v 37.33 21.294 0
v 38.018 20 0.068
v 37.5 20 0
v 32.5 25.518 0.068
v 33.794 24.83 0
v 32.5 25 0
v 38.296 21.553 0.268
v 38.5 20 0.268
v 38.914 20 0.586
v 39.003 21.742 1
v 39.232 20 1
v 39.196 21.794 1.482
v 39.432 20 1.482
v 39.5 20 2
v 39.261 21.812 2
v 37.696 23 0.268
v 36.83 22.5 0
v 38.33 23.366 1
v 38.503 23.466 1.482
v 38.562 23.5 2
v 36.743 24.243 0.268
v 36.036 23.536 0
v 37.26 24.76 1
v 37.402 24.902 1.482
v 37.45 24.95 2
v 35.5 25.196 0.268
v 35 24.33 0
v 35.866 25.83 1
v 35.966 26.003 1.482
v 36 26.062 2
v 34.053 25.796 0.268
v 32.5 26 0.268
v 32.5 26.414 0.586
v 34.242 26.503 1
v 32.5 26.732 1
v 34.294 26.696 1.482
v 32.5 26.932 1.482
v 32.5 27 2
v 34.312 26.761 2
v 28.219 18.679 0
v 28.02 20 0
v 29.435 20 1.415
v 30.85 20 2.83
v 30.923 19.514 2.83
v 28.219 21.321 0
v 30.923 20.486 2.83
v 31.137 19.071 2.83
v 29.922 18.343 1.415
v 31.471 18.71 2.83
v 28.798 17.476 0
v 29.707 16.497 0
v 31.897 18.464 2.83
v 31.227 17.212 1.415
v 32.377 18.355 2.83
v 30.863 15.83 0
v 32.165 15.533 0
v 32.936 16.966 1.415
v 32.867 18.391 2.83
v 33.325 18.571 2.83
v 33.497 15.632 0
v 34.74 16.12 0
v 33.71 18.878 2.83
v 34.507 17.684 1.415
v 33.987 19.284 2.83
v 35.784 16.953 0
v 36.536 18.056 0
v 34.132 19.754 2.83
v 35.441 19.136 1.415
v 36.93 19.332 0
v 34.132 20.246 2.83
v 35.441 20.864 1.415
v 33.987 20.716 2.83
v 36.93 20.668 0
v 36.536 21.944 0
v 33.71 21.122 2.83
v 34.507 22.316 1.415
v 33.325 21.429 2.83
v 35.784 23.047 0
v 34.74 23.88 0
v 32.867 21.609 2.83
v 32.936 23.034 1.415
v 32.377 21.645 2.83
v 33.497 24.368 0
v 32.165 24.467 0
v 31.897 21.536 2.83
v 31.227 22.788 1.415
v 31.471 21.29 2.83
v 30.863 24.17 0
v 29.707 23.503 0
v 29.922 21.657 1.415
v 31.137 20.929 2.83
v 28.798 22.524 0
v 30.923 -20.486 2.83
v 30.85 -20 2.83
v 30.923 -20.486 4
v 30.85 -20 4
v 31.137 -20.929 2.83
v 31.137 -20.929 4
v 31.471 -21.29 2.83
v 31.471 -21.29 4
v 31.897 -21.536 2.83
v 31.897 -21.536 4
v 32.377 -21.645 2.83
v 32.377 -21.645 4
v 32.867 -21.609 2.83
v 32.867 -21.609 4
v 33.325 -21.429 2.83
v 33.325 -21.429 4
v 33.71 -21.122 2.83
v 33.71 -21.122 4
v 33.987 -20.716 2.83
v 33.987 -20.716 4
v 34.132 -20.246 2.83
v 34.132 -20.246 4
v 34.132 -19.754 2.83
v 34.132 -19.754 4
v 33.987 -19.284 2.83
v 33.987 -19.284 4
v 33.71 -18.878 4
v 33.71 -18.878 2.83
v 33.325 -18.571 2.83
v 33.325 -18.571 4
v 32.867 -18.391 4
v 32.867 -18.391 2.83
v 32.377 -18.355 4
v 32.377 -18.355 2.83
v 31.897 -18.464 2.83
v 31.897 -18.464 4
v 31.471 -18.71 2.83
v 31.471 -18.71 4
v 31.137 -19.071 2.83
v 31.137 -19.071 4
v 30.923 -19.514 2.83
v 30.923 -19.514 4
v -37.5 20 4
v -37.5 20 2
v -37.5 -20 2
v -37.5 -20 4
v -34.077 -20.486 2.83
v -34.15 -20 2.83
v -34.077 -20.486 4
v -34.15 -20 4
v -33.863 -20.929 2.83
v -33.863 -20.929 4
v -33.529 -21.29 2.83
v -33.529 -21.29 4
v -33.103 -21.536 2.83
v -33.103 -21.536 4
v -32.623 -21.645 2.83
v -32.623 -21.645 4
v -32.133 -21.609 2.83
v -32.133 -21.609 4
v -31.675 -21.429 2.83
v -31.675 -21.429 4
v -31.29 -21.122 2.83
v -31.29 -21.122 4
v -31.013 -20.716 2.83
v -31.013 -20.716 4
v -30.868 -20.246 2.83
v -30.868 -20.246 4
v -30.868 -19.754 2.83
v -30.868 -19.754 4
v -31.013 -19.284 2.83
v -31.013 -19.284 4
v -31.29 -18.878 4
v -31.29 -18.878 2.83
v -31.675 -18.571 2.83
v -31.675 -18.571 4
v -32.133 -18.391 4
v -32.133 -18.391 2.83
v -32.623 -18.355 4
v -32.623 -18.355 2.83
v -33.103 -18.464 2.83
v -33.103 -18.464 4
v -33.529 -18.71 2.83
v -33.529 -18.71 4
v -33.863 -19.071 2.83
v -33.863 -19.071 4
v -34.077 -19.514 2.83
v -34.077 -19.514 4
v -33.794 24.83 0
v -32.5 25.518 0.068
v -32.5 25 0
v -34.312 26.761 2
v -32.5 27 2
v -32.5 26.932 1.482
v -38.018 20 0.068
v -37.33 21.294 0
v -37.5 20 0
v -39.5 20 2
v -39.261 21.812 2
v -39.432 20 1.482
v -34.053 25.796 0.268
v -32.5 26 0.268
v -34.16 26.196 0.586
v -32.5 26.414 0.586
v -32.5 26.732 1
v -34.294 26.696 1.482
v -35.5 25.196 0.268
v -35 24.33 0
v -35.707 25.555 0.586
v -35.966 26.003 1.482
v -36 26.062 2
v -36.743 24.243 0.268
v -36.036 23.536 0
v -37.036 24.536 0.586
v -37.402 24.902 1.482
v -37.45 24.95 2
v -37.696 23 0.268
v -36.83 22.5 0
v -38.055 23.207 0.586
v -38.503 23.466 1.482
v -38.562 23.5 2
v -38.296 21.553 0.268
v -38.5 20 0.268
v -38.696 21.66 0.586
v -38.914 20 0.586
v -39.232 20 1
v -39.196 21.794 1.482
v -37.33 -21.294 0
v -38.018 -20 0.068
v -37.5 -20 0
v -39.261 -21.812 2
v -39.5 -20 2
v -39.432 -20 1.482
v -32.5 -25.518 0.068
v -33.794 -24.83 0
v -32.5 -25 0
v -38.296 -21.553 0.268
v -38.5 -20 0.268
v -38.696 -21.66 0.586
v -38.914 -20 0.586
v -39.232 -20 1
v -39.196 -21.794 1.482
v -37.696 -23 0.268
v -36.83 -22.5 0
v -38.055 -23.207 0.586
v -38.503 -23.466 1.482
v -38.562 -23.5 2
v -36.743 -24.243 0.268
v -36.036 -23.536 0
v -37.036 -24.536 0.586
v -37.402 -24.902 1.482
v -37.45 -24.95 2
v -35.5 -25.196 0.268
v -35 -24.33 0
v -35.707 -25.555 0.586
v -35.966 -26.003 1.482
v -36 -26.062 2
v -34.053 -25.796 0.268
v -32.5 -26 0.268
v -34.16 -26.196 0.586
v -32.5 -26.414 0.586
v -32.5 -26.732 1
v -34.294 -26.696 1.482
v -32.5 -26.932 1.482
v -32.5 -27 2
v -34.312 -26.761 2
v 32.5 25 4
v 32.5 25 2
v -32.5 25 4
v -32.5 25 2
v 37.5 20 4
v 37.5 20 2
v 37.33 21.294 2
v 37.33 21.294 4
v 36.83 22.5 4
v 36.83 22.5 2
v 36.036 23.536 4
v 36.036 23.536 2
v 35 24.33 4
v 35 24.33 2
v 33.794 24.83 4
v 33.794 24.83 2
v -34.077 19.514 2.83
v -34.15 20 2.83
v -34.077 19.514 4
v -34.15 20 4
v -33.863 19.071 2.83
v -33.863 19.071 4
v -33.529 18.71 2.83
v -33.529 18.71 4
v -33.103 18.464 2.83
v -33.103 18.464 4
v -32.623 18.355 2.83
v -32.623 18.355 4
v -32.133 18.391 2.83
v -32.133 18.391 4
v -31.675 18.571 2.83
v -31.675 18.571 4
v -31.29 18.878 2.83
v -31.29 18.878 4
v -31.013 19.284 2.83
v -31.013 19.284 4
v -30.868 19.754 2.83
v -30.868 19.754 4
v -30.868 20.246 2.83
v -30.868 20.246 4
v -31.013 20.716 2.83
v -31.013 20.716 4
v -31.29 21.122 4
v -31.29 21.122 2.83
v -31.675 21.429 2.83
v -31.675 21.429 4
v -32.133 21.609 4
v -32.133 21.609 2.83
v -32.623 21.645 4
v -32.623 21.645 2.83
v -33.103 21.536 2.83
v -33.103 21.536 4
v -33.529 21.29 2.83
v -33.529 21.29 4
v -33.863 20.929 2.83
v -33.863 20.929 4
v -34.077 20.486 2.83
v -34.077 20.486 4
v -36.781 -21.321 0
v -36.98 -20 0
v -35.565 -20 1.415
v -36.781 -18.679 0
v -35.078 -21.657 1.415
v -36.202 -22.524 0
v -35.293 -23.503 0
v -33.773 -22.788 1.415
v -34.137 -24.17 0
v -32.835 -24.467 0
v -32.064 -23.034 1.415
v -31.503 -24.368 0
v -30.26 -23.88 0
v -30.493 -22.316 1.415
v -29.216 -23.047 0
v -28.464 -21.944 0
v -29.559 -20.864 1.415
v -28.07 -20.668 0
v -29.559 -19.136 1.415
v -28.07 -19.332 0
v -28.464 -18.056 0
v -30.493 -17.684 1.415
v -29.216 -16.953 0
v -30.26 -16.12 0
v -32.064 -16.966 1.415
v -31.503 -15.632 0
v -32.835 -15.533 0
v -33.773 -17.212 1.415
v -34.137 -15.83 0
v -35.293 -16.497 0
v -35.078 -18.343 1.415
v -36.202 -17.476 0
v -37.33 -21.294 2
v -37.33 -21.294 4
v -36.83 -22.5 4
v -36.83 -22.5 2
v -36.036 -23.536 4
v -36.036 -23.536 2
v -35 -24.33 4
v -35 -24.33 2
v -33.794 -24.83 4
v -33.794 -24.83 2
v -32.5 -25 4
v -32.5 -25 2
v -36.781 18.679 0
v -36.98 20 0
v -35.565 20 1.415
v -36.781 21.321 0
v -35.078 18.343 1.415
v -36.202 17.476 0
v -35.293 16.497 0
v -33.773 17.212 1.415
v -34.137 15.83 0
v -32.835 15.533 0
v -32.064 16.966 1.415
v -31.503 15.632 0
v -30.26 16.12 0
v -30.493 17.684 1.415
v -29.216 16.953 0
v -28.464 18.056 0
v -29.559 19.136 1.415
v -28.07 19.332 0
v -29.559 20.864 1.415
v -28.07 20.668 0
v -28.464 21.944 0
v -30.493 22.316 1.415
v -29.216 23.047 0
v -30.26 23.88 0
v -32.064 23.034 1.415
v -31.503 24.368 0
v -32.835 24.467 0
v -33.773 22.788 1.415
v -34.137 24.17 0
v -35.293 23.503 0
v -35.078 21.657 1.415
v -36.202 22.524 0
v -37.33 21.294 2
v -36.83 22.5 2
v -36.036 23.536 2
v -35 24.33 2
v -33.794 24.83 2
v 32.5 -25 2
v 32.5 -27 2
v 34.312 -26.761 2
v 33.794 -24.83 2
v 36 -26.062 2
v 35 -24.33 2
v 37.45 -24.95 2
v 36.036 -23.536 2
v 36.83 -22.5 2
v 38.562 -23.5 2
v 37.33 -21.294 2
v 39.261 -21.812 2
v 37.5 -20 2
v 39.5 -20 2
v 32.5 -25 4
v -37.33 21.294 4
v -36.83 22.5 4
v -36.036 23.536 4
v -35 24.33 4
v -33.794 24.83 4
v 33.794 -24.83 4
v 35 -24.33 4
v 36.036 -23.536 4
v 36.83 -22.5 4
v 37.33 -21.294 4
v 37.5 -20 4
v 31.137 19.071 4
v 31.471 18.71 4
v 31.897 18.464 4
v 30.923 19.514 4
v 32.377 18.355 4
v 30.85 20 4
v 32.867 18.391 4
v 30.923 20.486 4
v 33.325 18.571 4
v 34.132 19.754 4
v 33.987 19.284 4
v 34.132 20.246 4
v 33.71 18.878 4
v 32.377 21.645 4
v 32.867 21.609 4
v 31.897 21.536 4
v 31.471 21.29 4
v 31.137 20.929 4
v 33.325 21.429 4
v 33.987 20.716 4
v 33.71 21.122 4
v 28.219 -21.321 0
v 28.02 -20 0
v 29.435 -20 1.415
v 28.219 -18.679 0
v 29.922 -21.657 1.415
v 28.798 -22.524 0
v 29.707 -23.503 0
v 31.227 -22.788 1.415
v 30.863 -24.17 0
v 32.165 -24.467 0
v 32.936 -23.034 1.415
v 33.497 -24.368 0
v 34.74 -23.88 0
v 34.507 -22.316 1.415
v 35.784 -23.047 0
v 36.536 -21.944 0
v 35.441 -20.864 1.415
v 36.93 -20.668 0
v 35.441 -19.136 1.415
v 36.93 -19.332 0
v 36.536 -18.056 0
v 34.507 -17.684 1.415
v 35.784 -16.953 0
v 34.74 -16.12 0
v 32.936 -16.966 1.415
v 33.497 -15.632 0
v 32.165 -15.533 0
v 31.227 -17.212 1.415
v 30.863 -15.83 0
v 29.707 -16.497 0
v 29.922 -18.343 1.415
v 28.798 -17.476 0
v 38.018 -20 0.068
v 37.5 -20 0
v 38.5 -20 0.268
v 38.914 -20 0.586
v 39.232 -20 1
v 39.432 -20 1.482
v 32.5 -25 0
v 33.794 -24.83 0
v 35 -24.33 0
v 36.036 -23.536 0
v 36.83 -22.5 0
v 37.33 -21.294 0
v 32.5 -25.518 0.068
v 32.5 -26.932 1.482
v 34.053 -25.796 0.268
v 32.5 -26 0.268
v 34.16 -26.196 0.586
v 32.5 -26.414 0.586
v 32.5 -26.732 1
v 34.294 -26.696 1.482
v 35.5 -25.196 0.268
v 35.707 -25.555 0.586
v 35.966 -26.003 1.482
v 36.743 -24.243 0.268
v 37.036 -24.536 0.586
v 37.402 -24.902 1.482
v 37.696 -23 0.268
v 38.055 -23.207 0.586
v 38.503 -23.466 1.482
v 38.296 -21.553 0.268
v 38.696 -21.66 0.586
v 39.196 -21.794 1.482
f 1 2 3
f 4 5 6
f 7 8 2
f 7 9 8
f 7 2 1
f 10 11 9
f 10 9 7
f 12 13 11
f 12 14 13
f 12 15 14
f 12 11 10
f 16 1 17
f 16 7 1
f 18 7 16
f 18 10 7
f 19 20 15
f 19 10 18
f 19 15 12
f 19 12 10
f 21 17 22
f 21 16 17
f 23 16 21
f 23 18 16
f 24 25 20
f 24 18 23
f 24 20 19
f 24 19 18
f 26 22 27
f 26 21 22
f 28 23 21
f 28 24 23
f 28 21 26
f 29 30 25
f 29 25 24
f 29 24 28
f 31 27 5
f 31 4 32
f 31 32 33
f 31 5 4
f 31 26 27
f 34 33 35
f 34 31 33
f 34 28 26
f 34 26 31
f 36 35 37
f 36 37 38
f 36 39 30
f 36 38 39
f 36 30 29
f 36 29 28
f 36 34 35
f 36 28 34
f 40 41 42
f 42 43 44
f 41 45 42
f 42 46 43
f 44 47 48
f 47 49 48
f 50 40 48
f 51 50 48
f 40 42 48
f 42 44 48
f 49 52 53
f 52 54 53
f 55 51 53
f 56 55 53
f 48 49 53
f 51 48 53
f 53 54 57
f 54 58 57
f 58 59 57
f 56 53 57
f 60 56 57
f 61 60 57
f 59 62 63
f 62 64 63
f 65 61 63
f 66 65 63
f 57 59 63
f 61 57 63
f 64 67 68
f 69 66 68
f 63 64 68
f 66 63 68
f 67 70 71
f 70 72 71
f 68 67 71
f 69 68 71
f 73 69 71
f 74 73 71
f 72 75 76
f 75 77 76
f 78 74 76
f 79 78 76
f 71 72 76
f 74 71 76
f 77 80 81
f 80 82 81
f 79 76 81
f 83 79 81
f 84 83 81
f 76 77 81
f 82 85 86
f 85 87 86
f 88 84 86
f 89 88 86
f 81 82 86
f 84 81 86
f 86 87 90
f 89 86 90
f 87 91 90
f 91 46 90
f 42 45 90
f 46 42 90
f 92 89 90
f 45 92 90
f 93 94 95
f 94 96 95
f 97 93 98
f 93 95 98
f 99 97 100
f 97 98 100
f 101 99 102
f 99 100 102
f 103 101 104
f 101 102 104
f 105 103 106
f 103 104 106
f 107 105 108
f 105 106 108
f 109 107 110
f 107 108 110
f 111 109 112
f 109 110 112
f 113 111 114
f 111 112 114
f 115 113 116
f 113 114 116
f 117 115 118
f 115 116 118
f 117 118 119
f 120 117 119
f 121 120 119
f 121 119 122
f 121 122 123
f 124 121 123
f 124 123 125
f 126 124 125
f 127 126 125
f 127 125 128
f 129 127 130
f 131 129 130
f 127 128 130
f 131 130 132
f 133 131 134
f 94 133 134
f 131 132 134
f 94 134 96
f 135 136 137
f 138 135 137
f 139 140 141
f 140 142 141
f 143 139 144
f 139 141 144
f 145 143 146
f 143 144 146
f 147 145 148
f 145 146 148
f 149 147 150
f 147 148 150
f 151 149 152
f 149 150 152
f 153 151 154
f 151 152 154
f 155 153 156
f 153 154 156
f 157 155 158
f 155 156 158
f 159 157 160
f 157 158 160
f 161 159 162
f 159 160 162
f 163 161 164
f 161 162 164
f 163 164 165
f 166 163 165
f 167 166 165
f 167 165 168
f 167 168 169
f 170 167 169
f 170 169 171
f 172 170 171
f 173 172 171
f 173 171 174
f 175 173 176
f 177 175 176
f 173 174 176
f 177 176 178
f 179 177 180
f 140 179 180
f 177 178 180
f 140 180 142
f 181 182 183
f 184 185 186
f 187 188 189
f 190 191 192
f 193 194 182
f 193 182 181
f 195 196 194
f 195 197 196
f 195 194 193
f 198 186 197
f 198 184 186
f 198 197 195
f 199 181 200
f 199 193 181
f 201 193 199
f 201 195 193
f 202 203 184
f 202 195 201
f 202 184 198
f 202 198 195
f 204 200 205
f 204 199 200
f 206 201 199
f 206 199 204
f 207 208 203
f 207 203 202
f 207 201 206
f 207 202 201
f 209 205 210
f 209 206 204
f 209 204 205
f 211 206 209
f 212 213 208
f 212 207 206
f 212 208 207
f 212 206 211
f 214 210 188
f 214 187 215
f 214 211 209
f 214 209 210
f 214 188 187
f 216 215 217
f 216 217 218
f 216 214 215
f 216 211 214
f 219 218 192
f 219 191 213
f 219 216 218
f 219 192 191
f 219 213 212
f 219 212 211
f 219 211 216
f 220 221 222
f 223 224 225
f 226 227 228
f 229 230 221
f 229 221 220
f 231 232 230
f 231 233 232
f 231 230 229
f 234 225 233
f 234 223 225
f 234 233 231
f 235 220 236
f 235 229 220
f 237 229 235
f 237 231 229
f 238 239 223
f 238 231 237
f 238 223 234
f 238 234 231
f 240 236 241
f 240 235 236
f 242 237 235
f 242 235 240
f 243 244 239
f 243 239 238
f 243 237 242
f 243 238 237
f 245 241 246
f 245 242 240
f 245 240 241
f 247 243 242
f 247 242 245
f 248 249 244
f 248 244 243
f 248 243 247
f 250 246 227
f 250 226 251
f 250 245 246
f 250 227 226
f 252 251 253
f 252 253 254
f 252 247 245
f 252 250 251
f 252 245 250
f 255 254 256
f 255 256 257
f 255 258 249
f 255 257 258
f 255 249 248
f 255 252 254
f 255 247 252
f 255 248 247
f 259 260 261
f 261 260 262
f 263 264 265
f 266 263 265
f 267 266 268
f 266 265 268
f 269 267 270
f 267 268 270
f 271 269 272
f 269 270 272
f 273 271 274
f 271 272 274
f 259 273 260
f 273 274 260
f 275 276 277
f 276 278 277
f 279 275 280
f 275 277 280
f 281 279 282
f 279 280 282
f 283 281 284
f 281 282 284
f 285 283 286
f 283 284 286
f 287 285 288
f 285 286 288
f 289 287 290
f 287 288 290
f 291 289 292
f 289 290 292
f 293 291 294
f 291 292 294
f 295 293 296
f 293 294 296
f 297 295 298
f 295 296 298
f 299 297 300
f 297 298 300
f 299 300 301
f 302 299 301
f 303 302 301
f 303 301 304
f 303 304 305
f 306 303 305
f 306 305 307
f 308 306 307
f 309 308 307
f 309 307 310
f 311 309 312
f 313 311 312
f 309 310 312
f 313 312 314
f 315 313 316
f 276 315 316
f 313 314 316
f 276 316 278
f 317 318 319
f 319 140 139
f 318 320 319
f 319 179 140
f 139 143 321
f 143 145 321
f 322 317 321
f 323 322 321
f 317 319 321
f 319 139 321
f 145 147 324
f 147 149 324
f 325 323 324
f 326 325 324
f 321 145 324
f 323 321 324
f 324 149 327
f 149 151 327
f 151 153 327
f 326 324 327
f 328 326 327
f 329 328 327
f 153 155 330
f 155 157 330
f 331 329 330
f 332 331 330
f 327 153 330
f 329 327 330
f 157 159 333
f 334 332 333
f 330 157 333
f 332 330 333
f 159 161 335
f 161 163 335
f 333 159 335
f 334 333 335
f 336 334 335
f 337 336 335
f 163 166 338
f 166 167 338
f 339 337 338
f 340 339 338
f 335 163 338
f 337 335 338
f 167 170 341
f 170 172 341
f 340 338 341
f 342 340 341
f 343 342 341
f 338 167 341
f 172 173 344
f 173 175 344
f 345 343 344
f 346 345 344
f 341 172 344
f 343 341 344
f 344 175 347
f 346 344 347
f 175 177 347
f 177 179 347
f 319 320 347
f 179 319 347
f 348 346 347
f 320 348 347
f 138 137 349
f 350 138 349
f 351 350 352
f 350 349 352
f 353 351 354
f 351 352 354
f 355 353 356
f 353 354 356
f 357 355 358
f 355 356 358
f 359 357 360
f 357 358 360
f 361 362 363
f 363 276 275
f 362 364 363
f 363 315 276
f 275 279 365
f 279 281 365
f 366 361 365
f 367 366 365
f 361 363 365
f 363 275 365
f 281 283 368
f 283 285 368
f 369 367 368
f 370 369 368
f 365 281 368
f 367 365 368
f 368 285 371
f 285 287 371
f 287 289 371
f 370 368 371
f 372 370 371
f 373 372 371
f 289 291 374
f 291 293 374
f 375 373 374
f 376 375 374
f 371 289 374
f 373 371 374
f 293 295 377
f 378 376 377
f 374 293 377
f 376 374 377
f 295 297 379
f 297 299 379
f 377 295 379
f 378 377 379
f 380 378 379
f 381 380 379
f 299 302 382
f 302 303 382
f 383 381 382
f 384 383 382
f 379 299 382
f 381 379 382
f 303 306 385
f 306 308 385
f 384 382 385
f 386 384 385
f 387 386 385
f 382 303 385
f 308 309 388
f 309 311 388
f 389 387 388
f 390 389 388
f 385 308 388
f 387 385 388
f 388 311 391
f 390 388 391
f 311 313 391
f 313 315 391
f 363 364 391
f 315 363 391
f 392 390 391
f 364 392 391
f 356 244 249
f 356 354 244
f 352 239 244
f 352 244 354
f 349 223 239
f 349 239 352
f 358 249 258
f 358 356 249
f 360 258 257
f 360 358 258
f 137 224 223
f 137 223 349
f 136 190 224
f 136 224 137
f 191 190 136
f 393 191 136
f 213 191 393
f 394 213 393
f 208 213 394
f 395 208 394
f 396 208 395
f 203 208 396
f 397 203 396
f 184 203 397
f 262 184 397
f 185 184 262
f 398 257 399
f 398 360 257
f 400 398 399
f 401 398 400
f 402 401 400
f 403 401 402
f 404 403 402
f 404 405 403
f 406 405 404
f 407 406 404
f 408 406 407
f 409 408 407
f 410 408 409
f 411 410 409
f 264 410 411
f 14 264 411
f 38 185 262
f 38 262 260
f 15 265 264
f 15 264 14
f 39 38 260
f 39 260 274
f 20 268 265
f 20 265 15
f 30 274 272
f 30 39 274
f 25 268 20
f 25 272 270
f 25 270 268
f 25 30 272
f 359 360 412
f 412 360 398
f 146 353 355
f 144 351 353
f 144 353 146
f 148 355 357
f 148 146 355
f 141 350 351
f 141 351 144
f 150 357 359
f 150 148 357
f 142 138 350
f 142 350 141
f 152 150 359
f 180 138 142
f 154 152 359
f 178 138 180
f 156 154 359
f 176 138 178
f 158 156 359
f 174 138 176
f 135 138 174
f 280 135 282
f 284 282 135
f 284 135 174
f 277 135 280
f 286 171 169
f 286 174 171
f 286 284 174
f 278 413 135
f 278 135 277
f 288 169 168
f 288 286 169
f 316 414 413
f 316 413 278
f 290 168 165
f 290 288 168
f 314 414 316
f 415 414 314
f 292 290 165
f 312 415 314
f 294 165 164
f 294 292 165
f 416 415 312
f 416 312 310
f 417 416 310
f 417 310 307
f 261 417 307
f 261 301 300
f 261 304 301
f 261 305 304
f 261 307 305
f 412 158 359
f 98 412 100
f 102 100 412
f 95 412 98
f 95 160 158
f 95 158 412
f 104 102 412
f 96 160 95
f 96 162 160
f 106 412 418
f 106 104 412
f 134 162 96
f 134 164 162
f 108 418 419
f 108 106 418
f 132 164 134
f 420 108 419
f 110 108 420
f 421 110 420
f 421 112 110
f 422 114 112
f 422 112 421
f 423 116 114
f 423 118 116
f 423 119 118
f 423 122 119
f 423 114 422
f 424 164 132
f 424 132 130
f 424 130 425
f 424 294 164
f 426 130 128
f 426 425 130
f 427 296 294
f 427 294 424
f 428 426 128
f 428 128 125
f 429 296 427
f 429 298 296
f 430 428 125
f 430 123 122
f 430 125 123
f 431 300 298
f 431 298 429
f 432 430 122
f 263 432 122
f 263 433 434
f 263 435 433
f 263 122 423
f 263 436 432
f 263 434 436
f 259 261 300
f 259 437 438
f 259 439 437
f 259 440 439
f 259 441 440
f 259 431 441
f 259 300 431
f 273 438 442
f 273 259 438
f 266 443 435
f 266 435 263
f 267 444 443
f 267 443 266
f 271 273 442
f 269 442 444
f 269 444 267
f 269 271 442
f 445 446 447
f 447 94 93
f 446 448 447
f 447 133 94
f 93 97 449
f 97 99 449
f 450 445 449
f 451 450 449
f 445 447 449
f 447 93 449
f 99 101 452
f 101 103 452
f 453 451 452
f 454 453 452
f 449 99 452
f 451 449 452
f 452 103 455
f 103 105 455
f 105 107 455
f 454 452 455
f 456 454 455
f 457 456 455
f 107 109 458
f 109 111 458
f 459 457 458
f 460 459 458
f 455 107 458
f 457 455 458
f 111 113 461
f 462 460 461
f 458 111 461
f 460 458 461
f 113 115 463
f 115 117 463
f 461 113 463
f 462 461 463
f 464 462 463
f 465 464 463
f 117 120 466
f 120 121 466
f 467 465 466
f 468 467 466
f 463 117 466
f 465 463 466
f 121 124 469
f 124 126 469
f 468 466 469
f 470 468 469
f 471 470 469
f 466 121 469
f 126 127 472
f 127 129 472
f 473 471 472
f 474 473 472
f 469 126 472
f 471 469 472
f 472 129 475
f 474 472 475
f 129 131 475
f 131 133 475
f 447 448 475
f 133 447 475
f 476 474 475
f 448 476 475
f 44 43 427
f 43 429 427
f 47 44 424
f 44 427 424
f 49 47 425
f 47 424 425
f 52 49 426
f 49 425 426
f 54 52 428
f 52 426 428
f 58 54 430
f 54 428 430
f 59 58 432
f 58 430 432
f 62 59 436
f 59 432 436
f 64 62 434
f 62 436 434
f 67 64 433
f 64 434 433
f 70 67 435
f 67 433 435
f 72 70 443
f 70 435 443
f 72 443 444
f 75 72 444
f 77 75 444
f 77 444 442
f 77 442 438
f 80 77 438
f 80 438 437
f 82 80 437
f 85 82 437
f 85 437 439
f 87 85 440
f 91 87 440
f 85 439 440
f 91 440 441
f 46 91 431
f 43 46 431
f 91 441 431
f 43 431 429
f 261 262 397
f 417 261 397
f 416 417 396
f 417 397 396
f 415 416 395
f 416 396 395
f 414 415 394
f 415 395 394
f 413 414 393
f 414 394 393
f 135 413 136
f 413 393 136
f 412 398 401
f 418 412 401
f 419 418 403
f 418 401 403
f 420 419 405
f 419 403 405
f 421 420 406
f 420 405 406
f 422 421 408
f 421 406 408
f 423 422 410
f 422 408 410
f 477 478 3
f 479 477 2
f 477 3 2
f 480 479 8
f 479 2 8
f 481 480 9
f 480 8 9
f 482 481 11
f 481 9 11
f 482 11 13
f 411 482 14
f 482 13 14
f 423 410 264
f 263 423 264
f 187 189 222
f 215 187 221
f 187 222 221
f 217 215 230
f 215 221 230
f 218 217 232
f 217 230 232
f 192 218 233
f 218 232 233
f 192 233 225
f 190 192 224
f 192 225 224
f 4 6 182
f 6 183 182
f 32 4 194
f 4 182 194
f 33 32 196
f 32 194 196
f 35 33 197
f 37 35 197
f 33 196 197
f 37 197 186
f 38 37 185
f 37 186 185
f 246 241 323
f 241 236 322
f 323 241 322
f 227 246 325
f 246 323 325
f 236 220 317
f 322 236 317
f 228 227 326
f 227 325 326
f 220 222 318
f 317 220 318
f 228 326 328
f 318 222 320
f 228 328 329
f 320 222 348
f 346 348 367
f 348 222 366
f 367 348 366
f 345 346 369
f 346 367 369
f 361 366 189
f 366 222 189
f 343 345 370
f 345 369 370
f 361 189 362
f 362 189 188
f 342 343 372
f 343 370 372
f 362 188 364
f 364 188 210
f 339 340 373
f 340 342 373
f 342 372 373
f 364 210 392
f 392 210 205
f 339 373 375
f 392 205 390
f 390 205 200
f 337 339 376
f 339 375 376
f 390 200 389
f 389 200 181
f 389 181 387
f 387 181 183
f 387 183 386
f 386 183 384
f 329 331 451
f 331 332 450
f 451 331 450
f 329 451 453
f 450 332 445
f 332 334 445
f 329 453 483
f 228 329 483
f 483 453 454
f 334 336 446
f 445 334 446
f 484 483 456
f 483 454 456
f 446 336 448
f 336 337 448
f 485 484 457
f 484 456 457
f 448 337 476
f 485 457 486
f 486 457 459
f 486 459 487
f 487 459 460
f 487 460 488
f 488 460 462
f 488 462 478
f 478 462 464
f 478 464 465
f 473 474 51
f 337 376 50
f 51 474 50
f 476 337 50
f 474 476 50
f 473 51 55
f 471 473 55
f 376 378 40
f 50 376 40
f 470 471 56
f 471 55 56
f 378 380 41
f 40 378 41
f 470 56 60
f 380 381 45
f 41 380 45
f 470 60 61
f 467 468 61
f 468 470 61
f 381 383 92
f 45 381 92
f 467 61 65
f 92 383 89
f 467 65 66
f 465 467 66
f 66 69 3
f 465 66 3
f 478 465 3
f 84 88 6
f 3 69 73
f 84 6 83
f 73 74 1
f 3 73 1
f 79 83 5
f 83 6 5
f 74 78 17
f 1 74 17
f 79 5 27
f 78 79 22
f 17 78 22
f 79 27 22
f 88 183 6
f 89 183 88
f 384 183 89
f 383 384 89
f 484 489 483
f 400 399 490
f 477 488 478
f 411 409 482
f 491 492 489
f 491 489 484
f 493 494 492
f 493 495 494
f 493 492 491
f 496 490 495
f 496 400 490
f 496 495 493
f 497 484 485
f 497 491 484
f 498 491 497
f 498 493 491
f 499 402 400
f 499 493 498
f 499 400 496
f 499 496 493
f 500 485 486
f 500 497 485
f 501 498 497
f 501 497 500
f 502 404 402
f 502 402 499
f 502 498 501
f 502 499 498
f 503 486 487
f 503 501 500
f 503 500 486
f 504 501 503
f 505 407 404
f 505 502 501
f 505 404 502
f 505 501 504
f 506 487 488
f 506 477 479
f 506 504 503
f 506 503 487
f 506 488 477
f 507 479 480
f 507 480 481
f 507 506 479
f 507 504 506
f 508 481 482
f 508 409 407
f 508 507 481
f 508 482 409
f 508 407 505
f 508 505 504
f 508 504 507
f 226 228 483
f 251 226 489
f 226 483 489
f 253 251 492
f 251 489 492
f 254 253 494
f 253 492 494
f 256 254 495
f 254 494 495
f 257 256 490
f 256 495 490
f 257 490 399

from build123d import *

# Parameters (mm, degrees)
F1_DEPTH       = 2
F2_DEPTH       = 4
F3_R           = 1.99999
F4_D           = 3.3
F4_CSINK_D     = 8.96
F4_CSINK_ANGLE = 90


# Not quite as in the source:
# - a fillet or chamfer is up to 0.001 mm smaller than in the source, because OpenCascade refuses the exact size


with BuildPart() as f1:
    # F0 (on Top) → F1 (new body)
    with BuildSketch(Plane.XY):
        with BuildLine():
            Line((32.5, 26.9999996311), (-32.5, 26.9999996311))
            ThreePointArc((-32.5, 26.9999996311), (-37.4497472074, 24.9497472074), (-39.4999996311, 20))
            Line((-39.4999996311, 20), (-39.4999996311, -20))
            ThreePointArc((-39.4999996311, -20), (-37.4497472074, -24.9497472074), (-32.5, -26.9999996311))
            Line((-32.5, -26.9999996311), (32.5, -26.9999996311))
            ThreePointArc((32.5, -26.9999996311), (37.4497472074, -24.9497472074), (39.4999996311, -20))
            Line((39.4999996311, -20), (39.4999996311, 20))
            ThreePointArc((39.4999996311, 20), (37.4497472074, 24.9497472074), (32.5, 26.9999996311))
        make_face()
        with BuildLine():
            ThreePointArc((-37.5, 20), (-36.0355339059, 23.5355339059), (-32.5, 25))
            Line((-32.5, 25), (32.5, 25))
            ThreePointArc((32.5, 25), (36.0355339059, 23.5355339059), (37.5, 20))
            Line((37.5, 20), (37.5, -20))
            ThreePointArc((37.5, -20), (36.0355339059, -23.5355339059), (32.5, -25))
            Line((32.5, -25), (-32.5, -25))
            ThreePointArc((-32.5, -25), (-36.0355339059, -23.5355339059), (-37.5, -20))
            Line((-37.5, -20), (-37.5, 20))
        make_face(mode=Mode.SUBTRACT)
        with BuildLine():
            Line((32.5, 25), (-32.5, 25))
            ThreePointArc((-32.5, 25), (-36.0355339059, 23.5355339059), (-37.5, 20))
            Line((-37.5, 20), (-37.5, -20))
            ThreePointArc((-37.5, -20), (-36.0355339059, -23.5355339059), (-32.5, -25))
            Line((-32.5, -25), (32.5, -25))
            ThreePointArc((32.5, -25), (36.0355339059, -23.5355339059), (37.5, -20))
            Line((37.5, -20), (37.5, 20))
            ThreePointArc((37.5, 20), (36.0355339059, 23.5355339059), (32.5, 25))
        make_face()
    extrude(amount=F1_DEPTH)

    # F0 (on Top) → F2 (join)
    with BuildSketch(Plane.XY):
        with BuildLine():
            Line((32.5, 25), (-32.5, 25))
            ThreePointArc((-32.5, 25), (-36.0355339059, 23.5355339059), (-37.5, 20))
            Line((-37.5, 20), (-37.5, -20))
            ThreePointArc((-37.5, -20), (-36.0355339059, -23.5355339059), (-32.5, -25))
            Line((-32.5, -25), (32.5, -25))
            ThreePointArc((32.5, -25), (36.0355339059, -23.5355339059), (37.5, -20))
            Line((37.5, -20), (37.5, 20))
            ThreePointArc((37.5, 20), (36.0355339059, 23.5355339059), (32.5, 25))
        make_face()
    extrude(amount=F2_DEPTH)

    # F3 (radius 2 in the source; OpenCascade refuses exactly that, so slightly less here)
    f3_edges = [f1.edges().sort_by_distance(p)[0] for p in [
        (0, 27, 0),
        (-37.449747, 24.949747, 0),
        (-39.5, 0, 0),
        (-37.449747, -24.949747, 0),
        (0, -27, 0),
        (37.449747, -24.949747, 0),
        (39.5, 0, 0),
        (37.449747, 24.949747, 0),
    ]]
    fillet(f3_edges, radius=F3_R)

    # F4 (through all)
    with Locations(Plane(origin=(0, 0, 0), x_dir=(1, 0, 0), z_dir=(0, 0, -1))):
        with Locations((32.5, 20), (32.5, -20), (-32.5, -20), (-32.5, 20)):
            CounterSinkHole(F4_D / 2, F4_CSINK_D / 2, counter_sink_angle=F4_CSINK_ANGLE)


solid = f1.part
